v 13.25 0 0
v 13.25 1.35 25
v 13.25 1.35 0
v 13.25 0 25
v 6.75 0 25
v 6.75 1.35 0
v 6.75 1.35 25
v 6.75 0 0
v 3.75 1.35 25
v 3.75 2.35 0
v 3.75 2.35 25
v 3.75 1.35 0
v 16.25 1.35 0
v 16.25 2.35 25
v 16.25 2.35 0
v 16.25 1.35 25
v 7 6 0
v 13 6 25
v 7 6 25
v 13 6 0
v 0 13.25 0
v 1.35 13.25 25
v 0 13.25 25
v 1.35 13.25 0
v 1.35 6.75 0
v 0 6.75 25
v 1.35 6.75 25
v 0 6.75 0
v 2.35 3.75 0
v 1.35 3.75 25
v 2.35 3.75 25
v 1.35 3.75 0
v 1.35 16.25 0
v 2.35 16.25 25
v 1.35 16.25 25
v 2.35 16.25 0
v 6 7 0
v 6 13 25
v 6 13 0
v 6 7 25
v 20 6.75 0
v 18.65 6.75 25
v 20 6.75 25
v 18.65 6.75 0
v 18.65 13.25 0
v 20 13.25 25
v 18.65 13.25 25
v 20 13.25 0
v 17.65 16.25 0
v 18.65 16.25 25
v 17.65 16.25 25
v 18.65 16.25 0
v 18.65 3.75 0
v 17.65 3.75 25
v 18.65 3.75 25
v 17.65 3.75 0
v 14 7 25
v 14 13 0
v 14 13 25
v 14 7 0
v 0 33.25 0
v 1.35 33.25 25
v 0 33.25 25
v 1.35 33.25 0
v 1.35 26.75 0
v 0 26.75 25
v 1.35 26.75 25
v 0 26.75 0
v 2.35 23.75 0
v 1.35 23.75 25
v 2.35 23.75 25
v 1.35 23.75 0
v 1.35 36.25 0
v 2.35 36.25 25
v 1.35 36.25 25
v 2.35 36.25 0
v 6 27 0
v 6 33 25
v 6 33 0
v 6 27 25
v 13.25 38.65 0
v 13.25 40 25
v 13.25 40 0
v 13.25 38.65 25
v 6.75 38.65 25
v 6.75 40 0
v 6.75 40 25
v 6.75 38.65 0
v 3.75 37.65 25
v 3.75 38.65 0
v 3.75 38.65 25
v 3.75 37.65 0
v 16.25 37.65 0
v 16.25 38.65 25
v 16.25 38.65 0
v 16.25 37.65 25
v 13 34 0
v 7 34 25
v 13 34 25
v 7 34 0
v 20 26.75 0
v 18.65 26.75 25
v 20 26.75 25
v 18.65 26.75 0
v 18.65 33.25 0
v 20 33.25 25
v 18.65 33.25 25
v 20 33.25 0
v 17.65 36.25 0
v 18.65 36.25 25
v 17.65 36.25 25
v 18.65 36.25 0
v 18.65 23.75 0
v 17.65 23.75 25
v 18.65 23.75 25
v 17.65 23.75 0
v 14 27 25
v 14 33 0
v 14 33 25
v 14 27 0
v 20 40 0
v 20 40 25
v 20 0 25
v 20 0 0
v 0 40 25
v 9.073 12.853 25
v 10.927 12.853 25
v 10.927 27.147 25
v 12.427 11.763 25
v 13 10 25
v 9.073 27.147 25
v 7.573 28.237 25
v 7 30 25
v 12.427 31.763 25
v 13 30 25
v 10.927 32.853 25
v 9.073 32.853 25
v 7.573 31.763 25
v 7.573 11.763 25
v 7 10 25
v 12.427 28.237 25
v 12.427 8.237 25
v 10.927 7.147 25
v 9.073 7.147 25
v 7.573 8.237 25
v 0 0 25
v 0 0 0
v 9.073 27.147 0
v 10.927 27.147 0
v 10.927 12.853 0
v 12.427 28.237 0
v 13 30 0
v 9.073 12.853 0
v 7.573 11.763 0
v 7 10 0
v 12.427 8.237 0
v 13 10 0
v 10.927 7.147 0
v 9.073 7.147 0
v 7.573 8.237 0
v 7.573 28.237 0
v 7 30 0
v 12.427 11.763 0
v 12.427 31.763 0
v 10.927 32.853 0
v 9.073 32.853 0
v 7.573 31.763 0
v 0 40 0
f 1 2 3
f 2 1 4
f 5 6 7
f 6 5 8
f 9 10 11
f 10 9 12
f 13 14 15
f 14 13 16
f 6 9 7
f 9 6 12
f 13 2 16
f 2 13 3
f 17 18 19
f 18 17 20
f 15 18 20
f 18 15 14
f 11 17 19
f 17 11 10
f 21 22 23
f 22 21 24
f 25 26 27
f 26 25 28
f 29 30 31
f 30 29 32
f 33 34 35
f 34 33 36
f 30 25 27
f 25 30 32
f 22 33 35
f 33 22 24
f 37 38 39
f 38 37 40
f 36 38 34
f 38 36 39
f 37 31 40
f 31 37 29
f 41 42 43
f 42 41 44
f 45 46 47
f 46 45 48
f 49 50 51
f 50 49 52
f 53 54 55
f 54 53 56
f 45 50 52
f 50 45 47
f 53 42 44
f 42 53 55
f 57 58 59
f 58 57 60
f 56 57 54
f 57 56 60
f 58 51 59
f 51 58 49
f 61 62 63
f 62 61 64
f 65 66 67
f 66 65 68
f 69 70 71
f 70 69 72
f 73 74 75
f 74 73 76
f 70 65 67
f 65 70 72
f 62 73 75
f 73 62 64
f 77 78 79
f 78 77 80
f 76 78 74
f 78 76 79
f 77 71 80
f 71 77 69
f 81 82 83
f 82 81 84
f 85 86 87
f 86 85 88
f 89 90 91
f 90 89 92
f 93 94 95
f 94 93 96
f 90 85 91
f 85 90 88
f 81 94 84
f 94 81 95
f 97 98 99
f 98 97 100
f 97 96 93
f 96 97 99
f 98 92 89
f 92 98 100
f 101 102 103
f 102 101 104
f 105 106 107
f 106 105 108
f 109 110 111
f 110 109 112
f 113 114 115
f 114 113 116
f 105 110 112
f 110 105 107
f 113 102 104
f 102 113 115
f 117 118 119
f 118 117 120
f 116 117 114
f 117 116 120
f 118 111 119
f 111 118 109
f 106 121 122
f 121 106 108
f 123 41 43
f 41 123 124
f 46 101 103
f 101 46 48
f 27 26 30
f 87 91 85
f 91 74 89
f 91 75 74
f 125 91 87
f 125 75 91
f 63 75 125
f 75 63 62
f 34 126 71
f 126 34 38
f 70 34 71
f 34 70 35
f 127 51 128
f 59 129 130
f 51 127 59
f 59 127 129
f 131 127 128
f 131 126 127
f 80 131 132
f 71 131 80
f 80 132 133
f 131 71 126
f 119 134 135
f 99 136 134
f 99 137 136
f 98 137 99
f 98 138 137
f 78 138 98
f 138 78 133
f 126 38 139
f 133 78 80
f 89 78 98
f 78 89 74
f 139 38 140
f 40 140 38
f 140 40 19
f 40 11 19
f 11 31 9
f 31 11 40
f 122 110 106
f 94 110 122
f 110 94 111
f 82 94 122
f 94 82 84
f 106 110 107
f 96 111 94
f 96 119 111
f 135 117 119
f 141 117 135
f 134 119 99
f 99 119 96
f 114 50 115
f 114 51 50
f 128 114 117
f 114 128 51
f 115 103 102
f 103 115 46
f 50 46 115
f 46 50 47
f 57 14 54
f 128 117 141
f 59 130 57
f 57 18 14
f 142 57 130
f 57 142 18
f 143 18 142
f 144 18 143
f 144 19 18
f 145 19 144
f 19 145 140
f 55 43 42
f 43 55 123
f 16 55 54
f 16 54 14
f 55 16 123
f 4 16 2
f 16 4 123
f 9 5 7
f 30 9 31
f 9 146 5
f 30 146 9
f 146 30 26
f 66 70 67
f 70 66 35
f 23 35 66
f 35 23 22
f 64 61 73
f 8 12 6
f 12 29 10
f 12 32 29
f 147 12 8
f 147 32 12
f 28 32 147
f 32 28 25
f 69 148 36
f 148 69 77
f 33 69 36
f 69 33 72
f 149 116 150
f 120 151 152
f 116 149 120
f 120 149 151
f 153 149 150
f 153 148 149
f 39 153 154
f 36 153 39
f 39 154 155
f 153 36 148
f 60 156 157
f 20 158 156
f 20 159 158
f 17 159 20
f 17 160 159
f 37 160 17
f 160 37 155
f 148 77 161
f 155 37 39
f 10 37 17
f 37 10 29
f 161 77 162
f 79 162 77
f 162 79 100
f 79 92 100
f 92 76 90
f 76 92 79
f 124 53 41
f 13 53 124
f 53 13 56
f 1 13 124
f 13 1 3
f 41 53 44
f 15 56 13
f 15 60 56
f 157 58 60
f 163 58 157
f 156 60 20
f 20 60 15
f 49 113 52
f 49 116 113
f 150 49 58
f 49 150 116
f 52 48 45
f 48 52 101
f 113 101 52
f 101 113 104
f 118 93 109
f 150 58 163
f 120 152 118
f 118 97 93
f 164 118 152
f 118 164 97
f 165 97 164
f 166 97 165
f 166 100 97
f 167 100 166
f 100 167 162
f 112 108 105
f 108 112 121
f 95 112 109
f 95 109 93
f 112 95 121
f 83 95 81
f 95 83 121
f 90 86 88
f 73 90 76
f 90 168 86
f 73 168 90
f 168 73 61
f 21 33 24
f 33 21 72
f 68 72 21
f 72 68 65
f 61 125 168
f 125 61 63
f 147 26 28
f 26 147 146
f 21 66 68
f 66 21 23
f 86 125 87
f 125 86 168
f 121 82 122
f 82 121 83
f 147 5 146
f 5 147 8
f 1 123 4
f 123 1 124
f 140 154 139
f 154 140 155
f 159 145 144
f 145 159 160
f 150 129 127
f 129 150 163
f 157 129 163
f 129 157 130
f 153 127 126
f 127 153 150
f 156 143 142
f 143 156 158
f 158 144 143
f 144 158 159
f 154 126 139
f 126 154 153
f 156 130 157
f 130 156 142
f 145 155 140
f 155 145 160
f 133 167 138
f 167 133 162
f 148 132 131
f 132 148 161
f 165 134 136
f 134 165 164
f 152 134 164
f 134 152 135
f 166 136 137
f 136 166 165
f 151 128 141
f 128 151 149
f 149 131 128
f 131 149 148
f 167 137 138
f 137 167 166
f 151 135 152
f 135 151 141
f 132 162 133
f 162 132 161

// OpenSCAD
//Specify the height
Height = 25 ; // [1:1:500]
//Specify the inner diameter
InnerDiameter = 6 ; // [5:1:6]

2040_Profile ();

module 2040_Profile() {
    color ("silver")
    difference () {
        translate ([0,0,0]) cube ([20,40,Height]);
        translate ([10,10,-1]) cylinder(d=InnerDiameter,h=+Height+2);
        translate ([10,30,-1]) cylinder(d=InnerDiameter,h=+Height+2);

        2020_ProfileCutOut (Height=Height);
        mirror ([1,0,0]) rotate ([0,0,90]) 2020_ProfileCutOut (Height=Height);
        *translate ([0,20,0]) mirror ([0,1,0]) 2020_ProfileCutOut (Height=Height);
        translate ([20,20,0]) rotate ([0,0,-90]) mirror ([0,1,0]) 2020_ProfileCutOut (Height=Height);

        *translate ([0,40,0]) 2020_ProfileCutOut (Height=Height);
        translate ([0,20,0]) mirror ([1,0,0]) rotate ([0,0,90]) 2020_ProfileCutOut (Height=Height);
        translate ([0,40,0]) mirror ([0,1,0]) 2020_ProfileCutOut (Height=Height);
        translate ([20,40,0]) rotate ([0,0,-90]) mirror ([0,1,0]) 2020_ProfileCutOut (Height=Height);
    }
}
module 2020_ProfileCutOut () {    
    union () {
        translate ([10-3.25,-0.5,-1]) cube ([6.5,6,Height+2]);
        hull () {
            translate ([10-6.25,1.35,-1]) cube ([12.5,1,Height+2]);
            translate ([10-3,5,-1]) cube ([6,1,Height+2]);
        }
    }
}
